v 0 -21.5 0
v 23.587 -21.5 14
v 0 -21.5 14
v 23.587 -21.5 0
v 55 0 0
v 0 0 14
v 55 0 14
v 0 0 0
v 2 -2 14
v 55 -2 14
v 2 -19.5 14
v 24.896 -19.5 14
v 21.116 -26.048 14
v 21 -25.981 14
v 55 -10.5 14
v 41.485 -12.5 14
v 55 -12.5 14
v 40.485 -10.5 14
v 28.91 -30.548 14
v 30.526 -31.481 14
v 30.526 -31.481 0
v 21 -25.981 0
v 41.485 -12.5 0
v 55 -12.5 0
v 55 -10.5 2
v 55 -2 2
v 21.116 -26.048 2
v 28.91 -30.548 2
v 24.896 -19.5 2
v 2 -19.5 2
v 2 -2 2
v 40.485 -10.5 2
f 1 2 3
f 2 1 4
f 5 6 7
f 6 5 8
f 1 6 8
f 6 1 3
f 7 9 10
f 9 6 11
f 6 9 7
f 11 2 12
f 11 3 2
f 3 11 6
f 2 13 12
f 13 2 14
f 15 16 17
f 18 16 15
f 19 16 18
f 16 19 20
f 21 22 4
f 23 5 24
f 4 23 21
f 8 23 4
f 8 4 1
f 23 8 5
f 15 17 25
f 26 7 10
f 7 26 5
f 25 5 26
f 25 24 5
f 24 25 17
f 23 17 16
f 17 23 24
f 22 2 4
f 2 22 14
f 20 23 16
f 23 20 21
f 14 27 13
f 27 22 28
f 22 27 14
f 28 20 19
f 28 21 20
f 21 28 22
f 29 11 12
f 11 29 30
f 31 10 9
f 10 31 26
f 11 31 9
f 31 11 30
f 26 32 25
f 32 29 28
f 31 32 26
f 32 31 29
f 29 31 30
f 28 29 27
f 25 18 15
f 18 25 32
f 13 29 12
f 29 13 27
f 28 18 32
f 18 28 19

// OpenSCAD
back_len=30;
front_len=25;
deep = 14;

height=30;

position=36;

rotation=30;

wall=2;

//all lengths are +1mm to allow some wiggling
keyboard_thickness_front= 8.5;
keyboard_thickness_back = 17.5;
tablet_thickness = 9;

module holder(){
difference(){
    union(){
cube([back_len,deep,keyboard_thickness_back+2*wall]);
translate([back_len,0,0])cube([front_len,deep,keyboard_thickness_front+2*wall]);
 translate([position,0,0])rotate([0,-30,0])cube([tablet_thickness+2,deep,height]);
    }

translate([2,wall,wall])cube([back_len,deep,keyboard_thickness_back]);

translate([back_len-2,2,2])cube([front_len+4,deep,keyboard_thickness_front]);

translate([position-1,2,2])rotate([0,-30,0])cube([tablet_thickness,deep,height+4]);
    
}
}

rotate([90,0,0])holder();
